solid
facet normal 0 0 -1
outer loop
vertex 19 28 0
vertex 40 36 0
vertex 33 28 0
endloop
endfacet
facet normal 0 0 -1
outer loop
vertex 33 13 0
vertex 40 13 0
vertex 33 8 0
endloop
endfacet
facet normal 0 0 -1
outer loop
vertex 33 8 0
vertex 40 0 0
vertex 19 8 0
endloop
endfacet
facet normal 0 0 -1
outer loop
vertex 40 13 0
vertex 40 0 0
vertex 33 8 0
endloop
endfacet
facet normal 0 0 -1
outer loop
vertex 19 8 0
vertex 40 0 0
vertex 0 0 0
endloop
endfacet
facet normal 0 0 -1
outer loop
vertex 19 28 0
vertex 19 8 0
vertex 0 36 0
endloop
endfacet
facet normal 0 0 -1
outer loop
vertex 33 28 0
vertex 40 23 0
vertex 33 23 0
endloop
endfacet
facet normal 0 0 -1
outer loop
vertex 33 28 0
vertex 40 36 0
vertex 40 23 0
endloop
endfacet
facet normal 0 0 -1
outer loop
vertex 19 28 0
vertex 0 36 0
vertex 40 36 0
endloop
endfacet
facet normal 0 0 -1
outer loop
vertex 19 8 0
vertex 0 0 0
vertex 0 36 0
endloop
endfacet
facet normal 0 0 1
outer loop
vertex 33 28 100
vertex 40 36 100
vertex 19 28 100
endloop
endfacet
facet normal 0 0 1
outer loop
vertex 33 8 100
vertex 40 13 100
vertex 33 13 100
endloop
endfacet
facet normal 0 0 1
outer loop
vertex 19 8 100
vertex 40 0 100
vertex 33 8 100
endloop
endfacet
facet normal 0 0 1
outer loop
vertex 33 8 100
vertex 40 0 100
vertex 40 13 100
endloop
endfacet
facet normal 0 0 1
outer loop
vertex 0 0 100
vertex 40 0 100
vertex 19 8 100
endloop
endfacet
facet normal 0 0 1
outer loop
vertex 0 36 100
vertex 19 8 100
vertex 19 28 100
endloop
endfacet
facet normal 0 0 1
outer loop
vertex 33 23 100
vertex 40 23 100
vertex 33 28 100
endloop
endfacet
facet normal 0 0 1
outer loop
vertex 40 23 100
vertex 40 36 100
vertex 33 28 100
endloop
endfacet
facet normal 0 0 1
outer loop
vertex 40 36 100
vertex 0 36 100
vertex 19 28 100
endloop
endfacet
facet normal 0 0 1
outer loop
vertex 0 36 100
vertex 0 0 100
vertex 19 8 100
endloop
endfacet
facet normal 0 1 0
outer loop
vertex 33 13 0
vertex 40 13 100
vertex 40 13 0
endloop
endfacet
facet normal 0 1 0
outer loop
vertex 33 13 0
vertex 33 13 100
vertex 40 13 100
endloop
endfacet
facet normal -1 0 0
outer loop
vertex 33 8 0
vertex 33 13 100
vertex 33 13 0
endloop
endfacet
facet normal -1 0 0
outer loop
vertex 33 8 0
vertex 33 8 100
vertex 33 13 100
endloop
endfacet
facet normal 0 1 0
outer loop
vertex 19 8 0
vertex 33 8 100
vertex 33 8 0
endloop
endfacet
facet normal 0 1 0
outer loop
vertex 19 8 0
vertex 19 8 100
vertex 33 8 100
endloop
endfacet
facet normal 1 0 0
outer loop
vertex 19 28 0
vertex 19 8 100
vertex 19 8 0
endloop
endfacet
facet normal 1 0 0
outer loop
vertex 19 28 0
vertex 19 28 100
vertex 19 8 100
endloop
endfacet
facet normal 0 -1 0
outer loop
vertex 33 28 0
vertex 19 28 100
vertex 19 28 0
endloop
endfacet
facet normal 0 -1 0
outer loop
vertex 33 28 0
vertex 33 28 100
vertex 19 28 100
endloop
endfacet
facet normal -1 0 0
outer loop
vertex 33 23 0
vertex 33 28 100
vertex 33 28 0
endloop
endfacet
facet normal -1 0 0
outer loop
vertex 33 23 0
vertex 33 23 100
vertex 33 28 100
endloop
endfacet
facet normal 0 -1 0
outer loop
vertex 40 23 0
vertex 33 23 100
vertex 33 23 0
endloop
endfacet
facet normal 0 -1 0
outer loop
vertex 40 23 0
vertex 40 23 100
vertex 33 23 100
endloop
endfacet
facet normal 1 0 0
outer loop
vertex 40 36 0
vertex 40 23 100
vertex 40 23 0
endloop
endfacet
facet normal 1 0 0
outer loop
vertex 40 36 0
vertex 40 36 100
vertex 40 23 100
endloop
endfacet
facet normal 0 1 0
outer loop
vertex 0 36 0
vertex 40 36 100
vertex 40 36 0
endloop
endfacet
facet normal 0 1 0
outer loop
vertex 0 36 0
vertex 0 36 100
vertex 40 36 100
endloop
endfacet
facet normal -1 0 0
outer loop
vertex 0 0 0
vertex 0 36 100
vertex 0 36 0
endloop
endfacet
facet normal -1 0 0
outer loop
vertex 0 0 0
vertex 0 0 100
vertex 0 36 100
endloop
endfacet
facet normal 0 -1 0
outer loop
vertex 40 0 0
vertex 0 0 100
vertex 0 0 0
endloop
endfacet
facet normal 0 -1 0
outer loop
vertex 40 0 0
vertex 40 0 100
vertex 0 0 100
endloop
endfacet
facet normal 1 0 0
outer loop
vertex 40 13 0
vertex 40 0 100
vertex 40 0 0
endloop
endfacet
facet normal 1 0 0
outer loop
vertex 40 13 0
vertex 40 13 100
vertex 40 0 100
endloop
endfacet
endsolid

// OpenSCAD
$fn = 32;

// ----------------------------------------------------------------------
// T-slot rail: 40 x 36 mm section, 100 mm long
// ----------------------------------------------------------------------

// --- parameters (mm) ---
profile_height = 100;     // extrusion height
profile_points = 12;      // points of the closed outline

profile = [[0, 0], [40, 0], [40, 13], [33, 13], [33, 8], [19, 8], [19, 28], [33, 28], [33, 23], [40, 23], [40, 36], [0, 36]];  // single closed polygon, 12 points, counter clockwise

// --- the one profile operation ---
linear_extrude(height = profile_height) polygon(points = profile);
